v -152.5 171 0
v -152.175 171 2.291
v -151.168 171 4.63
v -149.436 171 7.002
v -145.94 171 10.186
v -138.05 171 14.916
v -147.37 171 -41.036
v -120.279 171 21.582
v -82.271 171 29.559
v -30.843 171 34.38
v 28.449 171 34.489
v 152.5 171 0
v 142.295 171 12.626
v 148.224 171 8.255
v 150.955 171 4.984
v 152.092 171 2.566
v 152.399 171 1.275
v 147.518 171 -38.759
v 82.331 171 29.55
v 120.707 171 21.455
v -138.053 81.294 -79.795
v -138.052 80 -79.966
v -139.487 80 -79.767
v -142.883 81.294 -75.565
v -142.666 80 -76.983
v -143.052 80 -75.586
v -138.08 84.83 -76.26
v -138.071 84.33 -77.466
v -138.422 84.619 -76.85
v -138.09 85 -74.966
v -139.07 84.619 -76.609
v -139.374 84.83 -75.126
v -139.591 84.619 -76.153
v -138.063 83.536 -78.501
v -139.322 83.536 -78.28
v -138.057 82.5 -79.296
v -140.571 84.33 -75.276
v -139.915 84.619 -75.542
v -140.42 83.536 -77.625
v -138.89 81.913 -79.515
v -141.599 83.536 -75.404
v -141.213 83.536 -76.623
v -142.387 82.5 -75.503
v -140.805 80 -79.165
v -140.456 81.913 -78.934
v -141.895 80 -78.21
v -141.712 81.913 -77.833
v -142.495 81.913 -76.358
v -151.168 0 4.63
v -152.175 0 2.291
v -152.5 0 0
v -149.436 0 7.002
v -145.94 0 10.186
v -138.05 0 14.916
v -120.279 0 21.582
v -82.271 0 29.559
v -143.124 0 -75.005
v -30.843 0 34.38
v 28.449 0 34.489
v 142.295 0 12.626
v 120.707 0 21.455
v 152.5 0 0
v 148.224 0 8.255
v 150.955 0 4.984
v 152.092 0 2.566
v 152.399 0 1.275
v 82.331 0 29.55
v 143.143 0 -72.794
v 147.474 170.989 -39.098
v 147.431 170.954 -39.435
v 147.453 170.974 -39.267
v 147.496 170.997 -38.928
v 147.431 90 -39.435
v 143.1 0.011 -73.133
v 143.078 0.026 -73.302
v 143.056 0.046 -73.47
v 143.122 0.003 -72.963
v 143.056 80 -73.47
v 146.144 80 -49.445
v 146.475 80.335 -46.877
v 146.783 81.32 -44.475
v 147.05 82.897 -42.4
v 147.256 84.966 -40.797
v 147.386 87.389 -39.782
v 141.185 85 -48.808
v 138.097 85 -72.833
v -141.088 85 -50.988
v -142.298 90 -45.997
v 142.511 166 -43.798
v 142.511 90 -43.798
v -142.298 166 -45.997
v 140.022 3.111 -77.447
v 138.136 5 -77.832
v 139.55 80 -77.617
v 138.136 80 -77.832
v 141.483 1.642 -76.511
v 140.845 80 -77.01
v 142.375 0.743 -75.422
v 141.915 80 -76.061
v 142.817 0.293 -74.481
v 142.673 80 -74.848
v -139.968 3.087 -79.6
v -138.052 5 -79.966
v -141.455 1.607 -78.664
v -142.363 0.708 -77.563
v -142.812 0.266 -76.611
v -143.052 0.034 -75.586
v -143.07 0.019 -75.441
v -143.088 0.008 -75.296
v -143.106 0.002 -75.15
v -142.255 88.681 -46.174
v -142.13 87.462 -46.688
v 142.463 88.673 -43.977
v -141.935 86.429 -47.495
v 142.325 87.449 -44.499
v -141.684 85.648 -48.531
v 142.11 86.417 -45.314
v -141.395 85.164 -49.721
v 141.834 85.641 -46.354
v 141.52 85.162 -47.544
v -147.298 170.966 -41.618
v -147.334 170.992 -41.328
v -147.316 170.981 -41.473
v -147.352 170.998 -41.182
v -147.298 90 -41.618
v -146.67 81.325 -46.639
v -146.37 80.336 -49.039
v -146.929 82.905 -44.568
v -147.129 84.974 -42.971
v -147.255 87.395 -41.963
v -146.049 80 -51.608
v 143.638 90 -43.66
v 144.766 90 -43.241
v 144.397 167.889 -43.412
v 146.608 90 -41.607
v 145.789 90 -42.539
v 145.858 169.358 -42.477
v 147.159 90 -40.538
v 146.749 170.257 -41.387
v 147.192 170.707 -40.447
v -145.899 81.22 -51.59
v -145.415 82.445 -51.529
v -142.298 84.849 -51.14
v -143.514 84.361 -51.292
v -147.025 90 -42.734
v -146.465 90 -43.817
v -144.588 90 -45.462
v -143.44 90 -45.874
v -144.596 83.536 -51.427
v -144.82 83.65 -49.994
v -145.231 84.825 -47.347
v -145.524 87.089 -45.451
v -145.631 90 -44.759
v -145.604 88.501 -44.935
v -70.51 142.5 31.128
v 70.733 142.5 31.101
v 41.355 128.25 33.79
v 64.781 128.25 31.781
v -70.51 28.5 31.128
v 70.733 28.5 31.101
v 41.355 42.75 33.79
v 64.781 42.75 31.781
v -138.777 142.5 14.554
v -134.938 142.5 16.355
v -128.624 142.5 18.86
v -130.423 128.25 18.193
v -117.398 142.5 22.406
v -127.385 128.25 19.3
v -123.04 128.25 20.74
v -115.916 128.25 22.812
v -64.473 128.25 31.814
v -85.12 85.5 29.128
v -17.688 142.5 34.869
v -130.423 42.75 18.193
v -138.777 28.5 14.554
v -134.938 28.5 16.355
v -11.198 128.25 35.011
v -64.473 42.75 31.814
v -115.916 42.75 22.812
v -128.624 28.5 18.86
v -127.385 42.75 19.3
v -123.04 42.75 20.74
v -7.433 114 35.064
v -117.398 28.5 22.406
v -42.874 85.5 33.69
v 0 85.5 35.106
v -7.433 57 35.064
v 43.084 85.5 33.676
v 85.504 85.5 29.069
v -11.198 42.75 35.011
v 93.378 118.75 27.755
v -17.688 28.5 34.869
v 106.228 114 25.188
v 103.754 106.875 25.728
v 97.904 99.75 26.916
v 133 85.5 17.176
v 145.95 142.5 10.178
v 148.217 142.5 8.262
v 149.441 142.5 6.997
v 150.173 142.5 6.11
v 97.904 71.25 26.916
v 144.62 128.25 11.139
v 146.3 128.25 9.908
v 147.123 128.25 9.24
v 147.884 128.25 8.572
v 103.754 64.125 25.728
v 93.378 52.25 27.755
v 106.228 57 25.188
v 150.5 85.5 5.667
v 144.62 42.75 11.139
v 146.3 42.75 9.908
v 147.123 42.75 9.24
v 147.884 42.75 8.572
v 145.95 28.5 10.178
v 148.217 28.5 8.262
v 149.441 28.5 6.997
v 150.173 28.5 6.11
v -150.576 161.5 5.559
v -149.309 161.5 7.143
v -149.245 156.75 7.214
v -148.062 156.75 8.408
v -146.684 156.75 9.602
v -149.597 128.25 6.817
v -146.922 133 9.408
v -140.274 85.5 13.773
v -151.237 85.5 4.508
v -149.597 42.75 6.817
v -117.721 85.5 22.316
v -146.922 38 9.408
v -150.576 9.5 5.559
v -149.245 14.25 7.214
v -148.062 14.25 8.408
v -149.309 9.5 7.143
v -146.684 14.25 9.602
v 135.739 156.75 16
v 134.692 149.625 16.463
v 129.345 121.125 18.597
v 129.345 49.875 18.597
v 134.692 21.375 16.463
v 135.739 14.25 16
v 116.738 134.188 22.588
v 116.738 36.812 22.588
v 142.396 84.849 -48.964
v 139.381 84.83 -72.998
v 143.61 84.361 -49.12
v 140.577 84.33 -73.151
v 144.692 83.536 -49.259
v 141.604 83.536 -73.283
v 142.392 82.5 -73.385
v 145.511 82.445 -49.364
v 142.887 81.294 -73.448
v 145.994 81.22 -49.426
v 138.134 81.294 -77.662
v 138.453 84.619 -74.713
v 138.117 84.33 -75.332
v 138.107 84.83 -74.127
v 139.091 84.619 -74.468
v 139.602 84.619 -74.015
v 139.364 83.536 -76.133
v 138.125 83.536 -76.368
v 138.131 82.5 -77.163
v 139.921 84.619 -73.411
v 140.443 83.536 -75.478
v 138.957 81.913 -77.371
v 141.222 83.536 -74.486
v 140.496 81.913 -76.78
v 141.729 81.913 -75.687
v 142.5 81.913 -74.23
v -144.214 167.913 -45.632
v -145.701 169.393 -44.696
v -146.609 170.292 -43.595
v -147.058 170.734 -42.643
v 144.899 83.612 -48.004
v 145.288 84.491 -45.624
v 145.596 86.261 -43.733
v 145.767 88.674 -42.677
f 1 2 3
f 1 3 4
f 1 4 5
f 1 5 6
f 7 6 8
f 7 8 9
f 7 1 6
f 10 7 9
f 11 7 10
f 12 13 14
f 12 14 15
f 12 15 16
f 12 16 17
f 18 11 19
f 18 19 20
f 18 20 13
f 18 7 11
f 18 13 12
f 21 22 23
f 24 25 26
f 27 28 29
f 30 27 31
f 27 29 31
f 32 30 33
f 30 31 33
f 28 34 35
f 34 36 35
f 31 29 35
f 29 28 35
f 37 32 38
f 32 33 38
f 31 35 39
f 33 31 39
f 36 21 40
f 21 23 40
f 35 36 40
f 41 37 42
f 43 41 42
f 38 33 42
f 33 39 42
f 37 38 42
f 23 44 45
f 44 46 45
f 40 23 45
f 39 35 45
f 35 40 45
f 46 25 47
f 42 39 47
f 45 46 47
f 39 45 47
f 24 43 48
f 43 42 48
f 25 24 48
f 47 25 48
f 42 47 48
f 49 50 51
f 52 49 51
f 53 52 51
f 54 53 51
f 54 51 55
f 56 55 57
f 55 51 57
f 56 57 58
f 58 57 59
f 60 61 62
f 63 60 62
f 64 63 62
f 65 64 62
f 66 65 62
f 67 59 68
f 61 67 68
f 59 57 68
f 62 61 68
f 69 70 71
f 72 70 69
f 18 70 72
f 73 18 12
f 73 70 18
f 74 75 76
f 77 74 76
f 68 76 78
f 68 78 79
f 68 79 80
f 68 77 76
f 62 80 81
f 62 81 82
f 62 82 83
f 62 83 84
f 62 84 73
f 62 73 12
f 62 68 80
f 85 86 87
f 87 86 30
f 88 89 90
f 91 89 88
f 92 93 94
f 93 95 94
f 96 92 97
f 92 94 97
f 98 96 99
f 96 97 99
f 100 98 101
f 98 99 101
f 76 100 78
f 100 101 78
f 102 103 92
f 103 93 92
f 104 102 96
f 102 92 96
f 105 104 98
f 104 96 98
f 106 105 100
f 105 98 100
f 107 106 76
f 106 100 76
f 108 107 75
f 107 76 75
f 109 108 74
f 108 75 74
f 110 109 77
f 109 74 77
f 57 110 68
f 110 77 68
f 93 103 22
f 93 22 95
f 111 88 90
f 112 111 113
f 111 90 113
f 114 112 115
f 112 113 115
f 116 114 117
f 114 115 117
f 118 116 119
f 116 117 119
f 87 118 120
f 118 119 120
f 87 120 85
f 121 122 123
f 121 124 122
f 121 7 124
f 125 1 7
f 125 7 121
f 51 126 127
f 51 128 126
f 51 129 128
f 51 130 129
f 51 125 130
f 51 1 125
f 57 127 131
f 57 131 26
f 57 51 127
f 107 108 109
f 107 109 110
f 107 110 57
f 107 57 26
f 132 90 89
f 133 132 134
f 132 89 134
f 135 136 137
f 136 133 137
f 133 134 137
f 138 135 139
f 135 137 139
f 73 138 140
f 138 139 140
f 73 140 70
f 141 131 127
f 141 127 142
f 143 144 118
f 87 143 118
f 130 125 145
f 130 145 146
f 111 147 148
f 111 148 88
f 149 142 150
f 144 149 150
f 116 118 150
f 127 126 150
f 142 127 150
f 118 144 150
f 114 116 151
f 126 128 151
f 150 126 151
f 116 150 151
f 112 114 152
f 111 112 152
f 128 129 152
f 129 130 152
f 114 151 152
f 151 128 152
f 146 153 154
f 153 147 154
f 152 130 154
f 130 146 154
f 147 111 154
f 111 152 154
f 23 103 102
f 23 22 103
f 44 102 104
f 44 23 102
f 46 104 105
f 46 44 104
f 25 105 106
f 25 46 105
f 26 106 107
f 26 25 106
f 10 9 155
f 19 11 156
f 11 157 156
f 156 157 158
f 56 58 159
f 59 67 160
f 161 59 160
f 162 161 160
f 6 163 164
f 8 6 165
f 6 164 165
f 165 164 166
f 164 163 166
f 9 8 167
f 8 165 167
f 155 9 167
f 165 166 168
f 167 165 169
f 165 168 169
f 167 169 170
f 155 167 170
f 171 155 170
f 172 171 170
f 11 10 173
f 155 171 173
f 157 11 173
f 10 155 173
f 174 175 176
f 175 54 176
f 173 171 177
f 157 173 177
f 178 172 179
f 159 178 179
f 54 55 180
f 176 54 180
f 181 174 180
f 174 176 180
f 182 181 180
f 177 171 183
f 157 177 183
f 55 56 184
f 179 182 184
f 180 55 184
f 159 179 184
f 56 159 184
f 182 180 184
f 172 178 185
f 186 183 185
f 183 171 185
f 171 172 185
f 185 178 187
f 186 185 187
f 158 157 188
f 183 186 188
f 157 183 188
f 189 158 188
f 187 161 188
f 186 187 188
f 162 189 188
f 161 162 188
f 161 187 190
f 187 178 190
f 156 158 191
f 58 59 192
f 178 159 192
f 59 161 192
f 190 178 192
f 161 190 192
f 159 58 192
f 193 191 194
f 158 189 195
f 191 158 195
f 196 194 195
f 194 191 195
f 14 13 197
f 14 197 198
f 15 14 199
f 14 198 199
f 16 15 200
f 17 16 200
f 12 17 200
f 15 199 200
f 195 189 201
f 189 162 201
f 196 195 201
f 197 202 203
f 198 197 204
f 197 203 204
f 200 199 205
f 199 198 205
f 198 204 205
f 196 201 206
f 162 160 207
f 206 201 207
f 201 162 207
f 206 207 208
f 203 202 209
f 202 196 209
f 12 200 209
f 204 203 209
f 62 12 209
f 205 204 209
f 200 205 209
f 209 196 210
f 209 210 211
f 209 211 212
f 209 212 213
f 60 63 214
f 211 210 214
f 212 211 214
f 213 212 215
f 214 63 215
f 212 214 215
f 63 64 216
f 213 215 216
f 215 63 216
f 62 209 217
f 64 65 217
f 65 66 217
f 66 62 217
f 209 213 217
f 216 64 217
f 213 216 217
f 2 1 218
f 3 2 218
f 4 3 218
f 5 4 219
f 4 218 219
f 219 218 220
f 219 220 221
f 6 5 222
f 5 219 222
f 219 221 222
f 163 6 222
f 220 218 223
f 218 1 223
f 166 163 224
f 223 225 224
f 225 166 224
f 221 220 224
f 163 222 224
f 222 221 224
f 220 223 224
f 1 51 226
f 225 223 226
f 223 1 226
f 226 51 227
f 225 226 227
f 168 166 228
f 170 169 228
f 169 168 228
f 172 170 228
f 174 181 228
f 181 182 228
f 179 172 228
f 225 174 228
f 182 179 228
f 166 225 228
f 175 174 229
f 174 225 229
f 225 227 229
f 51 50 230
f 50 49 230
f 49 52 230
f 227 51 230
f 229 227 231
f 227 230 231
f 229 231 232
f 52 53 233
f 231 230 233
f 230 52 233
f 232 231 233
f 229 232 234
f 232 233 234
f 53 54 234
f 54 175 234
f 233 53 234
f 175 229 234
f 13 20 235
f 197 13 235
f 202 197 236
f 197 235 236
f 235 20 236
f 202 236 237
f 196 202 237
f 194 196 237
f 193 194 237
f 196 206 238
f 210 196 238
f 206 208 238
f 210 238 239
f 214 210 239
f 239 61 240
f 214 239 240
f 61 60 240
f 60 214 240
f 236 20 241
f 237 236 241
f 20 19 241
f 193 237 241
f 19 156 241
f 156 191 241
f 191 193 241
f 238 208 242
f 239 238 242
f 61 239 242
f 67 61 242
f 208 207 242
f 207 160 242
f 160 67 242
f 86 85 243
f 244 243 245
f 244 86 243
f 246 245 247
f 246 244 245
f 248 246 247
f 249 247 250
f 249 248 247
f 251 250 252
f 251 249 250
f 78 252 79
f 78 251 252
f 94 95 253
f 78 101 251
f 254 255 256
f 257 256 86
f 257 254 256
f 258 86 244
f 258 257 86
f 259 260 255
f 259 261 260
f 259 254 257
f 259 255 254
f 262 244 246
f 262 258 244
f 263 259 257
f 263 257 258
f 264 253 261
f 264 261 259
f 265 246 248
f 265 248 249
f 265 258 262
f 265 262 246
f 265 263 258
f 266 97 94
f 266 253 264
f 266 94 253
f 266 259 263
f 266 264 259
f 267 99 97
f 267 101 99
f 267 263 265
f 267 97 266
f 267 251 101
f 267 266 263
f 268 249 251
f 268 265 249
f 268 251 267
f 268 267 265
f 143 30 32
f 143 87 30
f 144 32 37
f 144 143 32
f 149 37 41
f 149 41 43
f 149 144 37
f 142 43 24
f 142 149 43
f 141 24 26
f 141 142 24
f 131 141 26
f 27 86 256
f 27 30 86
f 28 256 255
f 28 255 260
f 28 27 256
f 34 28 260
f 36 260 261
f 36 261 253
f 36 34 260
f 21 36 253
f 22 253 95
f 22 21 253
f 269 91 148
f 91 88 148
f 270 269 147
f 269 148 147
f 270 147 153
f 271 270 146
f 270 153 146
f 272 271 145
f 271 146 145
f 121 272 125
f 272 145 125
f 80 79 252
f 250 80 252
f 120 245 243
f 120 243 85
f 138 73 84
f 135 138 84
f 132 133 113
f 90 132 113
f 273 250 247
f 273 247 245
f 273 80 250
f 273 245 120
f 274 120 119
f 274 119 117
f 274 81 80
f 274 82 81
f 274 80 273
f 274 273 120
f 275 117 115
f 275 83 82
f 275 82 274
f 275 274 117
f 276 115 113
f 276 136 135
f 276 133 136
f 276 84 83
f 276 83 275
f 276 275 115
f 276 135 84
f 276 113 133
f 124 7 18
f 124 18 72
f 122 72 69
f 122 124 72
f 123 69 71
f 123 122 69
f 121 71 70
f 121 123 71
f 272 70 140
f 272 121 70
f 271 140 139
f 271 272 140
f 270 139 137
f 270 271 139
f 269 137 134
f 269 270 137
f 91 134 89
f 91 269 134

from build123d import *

# Parameters (mm, degrees)
BOSS_EXTRUDE1_DEPTH = 171
SKETCH2_W           = 285.008501173
SKETCH2_H           = 86
CUT_EXTRUDE1_DEPTH  = 34
SKETCH2_4_W         = 9.911182985
SKETCH2_4_H         = 86
CUT_EXTRUDE3_DEPTH  = 34
FILLET2_R           = 5


with BuildPart() as part:
    # Sketch1 → Boss-Extrude1 (new body)
    with BuildSketch(Plane(origin=(0, 0, 0), x_dir=(1, 0, 0), z_dir=(0, 1, 0))):
        with BuildLine():
            Line((-142.5, 80), (-152.5, 0))
            add(Edge.make_bspline(
                [(-152.5, 0), (-152.5, -35.105695045), (0, -35.105695045), (152.5, -35.105695045), (152.5, 0)],
                knots=[3.141592654, 3.141592654, 3.141592654, 4.71238898, 4.71238898, 6.283185307, 6.283185307, 6.283185307], degree=2, weights=[1, 0.707106781, 1, 0.707106781, 1]))
            Line((152.5, 0), (142.5, 77.798695585))
            Line((142.5, 77.798695585), (-142.5, 80))
        make_face()
    extrude(amount=BOSS_EXTRUDE1_DEPTH)

    # Sketch2 → Cut-Extrude1 (cut)
    with BuildSketch(Plane(origin=(0.609372357, 0, -78.894641077), x_dir=(-0.999970172211013, 0, -0.00772364475341999), z_dir=(0.00772364475341999, 0, -0.999970172211013))):
        with Locations((0.609390534, 128)):
            Rectangle(SKETCH2_W, SKETCH2_H)
    extrude(amount=-CUT_EXTRUDE1_DEPTH, mode=Mode.SUBTRACT)

    # Sketch2<4> → Cut-Extrude3 (cut)
    with BuildSketch(Plane(origin=(0.609372357, 0, -78.894641077), x_dir=(-0.999970172211013, 0, -0.00772364475341999), z_dir=(0.00772364475341999, 0, -0.999970172211013))):
        Polygon((-152.3840102, 85), (-141.894860053, 85), (-141.894860053, 171), (-152.3840102, 171.36474149), align=None)
        with Locations((148.069232613, 128)):
            Rectangle(SKETCH2_4_W, SKETCH2_4_H)
    extrude(amount=-CUT_EXTRUDE3_DEPTH, mode=Mode.SUBTRACT)

    # Fillet2
    fillet2_edges = [part.edges().sort_by_distance(p)[0] for p in [
        (146.874726821, 128, -43.763891566),
        (-146.746027299, 128, -46.03178161),
        (-142.5, 42.5, -80),
        (0, 0, -78.899347793),
        (142.5, 42.5, -77.798695585),
        (0, 85, -78.899347793),
        (0.064349761, 171, -44.897836588),
        (144.68736341, 85, -60.781293576),
        (-144.623013649, 85, -63.015890805),
        (0.064349761, 85, -44.897836588),
    ]]
    fillet(fillet2_edges, radius=FILLET2_R)


solid = part.part
